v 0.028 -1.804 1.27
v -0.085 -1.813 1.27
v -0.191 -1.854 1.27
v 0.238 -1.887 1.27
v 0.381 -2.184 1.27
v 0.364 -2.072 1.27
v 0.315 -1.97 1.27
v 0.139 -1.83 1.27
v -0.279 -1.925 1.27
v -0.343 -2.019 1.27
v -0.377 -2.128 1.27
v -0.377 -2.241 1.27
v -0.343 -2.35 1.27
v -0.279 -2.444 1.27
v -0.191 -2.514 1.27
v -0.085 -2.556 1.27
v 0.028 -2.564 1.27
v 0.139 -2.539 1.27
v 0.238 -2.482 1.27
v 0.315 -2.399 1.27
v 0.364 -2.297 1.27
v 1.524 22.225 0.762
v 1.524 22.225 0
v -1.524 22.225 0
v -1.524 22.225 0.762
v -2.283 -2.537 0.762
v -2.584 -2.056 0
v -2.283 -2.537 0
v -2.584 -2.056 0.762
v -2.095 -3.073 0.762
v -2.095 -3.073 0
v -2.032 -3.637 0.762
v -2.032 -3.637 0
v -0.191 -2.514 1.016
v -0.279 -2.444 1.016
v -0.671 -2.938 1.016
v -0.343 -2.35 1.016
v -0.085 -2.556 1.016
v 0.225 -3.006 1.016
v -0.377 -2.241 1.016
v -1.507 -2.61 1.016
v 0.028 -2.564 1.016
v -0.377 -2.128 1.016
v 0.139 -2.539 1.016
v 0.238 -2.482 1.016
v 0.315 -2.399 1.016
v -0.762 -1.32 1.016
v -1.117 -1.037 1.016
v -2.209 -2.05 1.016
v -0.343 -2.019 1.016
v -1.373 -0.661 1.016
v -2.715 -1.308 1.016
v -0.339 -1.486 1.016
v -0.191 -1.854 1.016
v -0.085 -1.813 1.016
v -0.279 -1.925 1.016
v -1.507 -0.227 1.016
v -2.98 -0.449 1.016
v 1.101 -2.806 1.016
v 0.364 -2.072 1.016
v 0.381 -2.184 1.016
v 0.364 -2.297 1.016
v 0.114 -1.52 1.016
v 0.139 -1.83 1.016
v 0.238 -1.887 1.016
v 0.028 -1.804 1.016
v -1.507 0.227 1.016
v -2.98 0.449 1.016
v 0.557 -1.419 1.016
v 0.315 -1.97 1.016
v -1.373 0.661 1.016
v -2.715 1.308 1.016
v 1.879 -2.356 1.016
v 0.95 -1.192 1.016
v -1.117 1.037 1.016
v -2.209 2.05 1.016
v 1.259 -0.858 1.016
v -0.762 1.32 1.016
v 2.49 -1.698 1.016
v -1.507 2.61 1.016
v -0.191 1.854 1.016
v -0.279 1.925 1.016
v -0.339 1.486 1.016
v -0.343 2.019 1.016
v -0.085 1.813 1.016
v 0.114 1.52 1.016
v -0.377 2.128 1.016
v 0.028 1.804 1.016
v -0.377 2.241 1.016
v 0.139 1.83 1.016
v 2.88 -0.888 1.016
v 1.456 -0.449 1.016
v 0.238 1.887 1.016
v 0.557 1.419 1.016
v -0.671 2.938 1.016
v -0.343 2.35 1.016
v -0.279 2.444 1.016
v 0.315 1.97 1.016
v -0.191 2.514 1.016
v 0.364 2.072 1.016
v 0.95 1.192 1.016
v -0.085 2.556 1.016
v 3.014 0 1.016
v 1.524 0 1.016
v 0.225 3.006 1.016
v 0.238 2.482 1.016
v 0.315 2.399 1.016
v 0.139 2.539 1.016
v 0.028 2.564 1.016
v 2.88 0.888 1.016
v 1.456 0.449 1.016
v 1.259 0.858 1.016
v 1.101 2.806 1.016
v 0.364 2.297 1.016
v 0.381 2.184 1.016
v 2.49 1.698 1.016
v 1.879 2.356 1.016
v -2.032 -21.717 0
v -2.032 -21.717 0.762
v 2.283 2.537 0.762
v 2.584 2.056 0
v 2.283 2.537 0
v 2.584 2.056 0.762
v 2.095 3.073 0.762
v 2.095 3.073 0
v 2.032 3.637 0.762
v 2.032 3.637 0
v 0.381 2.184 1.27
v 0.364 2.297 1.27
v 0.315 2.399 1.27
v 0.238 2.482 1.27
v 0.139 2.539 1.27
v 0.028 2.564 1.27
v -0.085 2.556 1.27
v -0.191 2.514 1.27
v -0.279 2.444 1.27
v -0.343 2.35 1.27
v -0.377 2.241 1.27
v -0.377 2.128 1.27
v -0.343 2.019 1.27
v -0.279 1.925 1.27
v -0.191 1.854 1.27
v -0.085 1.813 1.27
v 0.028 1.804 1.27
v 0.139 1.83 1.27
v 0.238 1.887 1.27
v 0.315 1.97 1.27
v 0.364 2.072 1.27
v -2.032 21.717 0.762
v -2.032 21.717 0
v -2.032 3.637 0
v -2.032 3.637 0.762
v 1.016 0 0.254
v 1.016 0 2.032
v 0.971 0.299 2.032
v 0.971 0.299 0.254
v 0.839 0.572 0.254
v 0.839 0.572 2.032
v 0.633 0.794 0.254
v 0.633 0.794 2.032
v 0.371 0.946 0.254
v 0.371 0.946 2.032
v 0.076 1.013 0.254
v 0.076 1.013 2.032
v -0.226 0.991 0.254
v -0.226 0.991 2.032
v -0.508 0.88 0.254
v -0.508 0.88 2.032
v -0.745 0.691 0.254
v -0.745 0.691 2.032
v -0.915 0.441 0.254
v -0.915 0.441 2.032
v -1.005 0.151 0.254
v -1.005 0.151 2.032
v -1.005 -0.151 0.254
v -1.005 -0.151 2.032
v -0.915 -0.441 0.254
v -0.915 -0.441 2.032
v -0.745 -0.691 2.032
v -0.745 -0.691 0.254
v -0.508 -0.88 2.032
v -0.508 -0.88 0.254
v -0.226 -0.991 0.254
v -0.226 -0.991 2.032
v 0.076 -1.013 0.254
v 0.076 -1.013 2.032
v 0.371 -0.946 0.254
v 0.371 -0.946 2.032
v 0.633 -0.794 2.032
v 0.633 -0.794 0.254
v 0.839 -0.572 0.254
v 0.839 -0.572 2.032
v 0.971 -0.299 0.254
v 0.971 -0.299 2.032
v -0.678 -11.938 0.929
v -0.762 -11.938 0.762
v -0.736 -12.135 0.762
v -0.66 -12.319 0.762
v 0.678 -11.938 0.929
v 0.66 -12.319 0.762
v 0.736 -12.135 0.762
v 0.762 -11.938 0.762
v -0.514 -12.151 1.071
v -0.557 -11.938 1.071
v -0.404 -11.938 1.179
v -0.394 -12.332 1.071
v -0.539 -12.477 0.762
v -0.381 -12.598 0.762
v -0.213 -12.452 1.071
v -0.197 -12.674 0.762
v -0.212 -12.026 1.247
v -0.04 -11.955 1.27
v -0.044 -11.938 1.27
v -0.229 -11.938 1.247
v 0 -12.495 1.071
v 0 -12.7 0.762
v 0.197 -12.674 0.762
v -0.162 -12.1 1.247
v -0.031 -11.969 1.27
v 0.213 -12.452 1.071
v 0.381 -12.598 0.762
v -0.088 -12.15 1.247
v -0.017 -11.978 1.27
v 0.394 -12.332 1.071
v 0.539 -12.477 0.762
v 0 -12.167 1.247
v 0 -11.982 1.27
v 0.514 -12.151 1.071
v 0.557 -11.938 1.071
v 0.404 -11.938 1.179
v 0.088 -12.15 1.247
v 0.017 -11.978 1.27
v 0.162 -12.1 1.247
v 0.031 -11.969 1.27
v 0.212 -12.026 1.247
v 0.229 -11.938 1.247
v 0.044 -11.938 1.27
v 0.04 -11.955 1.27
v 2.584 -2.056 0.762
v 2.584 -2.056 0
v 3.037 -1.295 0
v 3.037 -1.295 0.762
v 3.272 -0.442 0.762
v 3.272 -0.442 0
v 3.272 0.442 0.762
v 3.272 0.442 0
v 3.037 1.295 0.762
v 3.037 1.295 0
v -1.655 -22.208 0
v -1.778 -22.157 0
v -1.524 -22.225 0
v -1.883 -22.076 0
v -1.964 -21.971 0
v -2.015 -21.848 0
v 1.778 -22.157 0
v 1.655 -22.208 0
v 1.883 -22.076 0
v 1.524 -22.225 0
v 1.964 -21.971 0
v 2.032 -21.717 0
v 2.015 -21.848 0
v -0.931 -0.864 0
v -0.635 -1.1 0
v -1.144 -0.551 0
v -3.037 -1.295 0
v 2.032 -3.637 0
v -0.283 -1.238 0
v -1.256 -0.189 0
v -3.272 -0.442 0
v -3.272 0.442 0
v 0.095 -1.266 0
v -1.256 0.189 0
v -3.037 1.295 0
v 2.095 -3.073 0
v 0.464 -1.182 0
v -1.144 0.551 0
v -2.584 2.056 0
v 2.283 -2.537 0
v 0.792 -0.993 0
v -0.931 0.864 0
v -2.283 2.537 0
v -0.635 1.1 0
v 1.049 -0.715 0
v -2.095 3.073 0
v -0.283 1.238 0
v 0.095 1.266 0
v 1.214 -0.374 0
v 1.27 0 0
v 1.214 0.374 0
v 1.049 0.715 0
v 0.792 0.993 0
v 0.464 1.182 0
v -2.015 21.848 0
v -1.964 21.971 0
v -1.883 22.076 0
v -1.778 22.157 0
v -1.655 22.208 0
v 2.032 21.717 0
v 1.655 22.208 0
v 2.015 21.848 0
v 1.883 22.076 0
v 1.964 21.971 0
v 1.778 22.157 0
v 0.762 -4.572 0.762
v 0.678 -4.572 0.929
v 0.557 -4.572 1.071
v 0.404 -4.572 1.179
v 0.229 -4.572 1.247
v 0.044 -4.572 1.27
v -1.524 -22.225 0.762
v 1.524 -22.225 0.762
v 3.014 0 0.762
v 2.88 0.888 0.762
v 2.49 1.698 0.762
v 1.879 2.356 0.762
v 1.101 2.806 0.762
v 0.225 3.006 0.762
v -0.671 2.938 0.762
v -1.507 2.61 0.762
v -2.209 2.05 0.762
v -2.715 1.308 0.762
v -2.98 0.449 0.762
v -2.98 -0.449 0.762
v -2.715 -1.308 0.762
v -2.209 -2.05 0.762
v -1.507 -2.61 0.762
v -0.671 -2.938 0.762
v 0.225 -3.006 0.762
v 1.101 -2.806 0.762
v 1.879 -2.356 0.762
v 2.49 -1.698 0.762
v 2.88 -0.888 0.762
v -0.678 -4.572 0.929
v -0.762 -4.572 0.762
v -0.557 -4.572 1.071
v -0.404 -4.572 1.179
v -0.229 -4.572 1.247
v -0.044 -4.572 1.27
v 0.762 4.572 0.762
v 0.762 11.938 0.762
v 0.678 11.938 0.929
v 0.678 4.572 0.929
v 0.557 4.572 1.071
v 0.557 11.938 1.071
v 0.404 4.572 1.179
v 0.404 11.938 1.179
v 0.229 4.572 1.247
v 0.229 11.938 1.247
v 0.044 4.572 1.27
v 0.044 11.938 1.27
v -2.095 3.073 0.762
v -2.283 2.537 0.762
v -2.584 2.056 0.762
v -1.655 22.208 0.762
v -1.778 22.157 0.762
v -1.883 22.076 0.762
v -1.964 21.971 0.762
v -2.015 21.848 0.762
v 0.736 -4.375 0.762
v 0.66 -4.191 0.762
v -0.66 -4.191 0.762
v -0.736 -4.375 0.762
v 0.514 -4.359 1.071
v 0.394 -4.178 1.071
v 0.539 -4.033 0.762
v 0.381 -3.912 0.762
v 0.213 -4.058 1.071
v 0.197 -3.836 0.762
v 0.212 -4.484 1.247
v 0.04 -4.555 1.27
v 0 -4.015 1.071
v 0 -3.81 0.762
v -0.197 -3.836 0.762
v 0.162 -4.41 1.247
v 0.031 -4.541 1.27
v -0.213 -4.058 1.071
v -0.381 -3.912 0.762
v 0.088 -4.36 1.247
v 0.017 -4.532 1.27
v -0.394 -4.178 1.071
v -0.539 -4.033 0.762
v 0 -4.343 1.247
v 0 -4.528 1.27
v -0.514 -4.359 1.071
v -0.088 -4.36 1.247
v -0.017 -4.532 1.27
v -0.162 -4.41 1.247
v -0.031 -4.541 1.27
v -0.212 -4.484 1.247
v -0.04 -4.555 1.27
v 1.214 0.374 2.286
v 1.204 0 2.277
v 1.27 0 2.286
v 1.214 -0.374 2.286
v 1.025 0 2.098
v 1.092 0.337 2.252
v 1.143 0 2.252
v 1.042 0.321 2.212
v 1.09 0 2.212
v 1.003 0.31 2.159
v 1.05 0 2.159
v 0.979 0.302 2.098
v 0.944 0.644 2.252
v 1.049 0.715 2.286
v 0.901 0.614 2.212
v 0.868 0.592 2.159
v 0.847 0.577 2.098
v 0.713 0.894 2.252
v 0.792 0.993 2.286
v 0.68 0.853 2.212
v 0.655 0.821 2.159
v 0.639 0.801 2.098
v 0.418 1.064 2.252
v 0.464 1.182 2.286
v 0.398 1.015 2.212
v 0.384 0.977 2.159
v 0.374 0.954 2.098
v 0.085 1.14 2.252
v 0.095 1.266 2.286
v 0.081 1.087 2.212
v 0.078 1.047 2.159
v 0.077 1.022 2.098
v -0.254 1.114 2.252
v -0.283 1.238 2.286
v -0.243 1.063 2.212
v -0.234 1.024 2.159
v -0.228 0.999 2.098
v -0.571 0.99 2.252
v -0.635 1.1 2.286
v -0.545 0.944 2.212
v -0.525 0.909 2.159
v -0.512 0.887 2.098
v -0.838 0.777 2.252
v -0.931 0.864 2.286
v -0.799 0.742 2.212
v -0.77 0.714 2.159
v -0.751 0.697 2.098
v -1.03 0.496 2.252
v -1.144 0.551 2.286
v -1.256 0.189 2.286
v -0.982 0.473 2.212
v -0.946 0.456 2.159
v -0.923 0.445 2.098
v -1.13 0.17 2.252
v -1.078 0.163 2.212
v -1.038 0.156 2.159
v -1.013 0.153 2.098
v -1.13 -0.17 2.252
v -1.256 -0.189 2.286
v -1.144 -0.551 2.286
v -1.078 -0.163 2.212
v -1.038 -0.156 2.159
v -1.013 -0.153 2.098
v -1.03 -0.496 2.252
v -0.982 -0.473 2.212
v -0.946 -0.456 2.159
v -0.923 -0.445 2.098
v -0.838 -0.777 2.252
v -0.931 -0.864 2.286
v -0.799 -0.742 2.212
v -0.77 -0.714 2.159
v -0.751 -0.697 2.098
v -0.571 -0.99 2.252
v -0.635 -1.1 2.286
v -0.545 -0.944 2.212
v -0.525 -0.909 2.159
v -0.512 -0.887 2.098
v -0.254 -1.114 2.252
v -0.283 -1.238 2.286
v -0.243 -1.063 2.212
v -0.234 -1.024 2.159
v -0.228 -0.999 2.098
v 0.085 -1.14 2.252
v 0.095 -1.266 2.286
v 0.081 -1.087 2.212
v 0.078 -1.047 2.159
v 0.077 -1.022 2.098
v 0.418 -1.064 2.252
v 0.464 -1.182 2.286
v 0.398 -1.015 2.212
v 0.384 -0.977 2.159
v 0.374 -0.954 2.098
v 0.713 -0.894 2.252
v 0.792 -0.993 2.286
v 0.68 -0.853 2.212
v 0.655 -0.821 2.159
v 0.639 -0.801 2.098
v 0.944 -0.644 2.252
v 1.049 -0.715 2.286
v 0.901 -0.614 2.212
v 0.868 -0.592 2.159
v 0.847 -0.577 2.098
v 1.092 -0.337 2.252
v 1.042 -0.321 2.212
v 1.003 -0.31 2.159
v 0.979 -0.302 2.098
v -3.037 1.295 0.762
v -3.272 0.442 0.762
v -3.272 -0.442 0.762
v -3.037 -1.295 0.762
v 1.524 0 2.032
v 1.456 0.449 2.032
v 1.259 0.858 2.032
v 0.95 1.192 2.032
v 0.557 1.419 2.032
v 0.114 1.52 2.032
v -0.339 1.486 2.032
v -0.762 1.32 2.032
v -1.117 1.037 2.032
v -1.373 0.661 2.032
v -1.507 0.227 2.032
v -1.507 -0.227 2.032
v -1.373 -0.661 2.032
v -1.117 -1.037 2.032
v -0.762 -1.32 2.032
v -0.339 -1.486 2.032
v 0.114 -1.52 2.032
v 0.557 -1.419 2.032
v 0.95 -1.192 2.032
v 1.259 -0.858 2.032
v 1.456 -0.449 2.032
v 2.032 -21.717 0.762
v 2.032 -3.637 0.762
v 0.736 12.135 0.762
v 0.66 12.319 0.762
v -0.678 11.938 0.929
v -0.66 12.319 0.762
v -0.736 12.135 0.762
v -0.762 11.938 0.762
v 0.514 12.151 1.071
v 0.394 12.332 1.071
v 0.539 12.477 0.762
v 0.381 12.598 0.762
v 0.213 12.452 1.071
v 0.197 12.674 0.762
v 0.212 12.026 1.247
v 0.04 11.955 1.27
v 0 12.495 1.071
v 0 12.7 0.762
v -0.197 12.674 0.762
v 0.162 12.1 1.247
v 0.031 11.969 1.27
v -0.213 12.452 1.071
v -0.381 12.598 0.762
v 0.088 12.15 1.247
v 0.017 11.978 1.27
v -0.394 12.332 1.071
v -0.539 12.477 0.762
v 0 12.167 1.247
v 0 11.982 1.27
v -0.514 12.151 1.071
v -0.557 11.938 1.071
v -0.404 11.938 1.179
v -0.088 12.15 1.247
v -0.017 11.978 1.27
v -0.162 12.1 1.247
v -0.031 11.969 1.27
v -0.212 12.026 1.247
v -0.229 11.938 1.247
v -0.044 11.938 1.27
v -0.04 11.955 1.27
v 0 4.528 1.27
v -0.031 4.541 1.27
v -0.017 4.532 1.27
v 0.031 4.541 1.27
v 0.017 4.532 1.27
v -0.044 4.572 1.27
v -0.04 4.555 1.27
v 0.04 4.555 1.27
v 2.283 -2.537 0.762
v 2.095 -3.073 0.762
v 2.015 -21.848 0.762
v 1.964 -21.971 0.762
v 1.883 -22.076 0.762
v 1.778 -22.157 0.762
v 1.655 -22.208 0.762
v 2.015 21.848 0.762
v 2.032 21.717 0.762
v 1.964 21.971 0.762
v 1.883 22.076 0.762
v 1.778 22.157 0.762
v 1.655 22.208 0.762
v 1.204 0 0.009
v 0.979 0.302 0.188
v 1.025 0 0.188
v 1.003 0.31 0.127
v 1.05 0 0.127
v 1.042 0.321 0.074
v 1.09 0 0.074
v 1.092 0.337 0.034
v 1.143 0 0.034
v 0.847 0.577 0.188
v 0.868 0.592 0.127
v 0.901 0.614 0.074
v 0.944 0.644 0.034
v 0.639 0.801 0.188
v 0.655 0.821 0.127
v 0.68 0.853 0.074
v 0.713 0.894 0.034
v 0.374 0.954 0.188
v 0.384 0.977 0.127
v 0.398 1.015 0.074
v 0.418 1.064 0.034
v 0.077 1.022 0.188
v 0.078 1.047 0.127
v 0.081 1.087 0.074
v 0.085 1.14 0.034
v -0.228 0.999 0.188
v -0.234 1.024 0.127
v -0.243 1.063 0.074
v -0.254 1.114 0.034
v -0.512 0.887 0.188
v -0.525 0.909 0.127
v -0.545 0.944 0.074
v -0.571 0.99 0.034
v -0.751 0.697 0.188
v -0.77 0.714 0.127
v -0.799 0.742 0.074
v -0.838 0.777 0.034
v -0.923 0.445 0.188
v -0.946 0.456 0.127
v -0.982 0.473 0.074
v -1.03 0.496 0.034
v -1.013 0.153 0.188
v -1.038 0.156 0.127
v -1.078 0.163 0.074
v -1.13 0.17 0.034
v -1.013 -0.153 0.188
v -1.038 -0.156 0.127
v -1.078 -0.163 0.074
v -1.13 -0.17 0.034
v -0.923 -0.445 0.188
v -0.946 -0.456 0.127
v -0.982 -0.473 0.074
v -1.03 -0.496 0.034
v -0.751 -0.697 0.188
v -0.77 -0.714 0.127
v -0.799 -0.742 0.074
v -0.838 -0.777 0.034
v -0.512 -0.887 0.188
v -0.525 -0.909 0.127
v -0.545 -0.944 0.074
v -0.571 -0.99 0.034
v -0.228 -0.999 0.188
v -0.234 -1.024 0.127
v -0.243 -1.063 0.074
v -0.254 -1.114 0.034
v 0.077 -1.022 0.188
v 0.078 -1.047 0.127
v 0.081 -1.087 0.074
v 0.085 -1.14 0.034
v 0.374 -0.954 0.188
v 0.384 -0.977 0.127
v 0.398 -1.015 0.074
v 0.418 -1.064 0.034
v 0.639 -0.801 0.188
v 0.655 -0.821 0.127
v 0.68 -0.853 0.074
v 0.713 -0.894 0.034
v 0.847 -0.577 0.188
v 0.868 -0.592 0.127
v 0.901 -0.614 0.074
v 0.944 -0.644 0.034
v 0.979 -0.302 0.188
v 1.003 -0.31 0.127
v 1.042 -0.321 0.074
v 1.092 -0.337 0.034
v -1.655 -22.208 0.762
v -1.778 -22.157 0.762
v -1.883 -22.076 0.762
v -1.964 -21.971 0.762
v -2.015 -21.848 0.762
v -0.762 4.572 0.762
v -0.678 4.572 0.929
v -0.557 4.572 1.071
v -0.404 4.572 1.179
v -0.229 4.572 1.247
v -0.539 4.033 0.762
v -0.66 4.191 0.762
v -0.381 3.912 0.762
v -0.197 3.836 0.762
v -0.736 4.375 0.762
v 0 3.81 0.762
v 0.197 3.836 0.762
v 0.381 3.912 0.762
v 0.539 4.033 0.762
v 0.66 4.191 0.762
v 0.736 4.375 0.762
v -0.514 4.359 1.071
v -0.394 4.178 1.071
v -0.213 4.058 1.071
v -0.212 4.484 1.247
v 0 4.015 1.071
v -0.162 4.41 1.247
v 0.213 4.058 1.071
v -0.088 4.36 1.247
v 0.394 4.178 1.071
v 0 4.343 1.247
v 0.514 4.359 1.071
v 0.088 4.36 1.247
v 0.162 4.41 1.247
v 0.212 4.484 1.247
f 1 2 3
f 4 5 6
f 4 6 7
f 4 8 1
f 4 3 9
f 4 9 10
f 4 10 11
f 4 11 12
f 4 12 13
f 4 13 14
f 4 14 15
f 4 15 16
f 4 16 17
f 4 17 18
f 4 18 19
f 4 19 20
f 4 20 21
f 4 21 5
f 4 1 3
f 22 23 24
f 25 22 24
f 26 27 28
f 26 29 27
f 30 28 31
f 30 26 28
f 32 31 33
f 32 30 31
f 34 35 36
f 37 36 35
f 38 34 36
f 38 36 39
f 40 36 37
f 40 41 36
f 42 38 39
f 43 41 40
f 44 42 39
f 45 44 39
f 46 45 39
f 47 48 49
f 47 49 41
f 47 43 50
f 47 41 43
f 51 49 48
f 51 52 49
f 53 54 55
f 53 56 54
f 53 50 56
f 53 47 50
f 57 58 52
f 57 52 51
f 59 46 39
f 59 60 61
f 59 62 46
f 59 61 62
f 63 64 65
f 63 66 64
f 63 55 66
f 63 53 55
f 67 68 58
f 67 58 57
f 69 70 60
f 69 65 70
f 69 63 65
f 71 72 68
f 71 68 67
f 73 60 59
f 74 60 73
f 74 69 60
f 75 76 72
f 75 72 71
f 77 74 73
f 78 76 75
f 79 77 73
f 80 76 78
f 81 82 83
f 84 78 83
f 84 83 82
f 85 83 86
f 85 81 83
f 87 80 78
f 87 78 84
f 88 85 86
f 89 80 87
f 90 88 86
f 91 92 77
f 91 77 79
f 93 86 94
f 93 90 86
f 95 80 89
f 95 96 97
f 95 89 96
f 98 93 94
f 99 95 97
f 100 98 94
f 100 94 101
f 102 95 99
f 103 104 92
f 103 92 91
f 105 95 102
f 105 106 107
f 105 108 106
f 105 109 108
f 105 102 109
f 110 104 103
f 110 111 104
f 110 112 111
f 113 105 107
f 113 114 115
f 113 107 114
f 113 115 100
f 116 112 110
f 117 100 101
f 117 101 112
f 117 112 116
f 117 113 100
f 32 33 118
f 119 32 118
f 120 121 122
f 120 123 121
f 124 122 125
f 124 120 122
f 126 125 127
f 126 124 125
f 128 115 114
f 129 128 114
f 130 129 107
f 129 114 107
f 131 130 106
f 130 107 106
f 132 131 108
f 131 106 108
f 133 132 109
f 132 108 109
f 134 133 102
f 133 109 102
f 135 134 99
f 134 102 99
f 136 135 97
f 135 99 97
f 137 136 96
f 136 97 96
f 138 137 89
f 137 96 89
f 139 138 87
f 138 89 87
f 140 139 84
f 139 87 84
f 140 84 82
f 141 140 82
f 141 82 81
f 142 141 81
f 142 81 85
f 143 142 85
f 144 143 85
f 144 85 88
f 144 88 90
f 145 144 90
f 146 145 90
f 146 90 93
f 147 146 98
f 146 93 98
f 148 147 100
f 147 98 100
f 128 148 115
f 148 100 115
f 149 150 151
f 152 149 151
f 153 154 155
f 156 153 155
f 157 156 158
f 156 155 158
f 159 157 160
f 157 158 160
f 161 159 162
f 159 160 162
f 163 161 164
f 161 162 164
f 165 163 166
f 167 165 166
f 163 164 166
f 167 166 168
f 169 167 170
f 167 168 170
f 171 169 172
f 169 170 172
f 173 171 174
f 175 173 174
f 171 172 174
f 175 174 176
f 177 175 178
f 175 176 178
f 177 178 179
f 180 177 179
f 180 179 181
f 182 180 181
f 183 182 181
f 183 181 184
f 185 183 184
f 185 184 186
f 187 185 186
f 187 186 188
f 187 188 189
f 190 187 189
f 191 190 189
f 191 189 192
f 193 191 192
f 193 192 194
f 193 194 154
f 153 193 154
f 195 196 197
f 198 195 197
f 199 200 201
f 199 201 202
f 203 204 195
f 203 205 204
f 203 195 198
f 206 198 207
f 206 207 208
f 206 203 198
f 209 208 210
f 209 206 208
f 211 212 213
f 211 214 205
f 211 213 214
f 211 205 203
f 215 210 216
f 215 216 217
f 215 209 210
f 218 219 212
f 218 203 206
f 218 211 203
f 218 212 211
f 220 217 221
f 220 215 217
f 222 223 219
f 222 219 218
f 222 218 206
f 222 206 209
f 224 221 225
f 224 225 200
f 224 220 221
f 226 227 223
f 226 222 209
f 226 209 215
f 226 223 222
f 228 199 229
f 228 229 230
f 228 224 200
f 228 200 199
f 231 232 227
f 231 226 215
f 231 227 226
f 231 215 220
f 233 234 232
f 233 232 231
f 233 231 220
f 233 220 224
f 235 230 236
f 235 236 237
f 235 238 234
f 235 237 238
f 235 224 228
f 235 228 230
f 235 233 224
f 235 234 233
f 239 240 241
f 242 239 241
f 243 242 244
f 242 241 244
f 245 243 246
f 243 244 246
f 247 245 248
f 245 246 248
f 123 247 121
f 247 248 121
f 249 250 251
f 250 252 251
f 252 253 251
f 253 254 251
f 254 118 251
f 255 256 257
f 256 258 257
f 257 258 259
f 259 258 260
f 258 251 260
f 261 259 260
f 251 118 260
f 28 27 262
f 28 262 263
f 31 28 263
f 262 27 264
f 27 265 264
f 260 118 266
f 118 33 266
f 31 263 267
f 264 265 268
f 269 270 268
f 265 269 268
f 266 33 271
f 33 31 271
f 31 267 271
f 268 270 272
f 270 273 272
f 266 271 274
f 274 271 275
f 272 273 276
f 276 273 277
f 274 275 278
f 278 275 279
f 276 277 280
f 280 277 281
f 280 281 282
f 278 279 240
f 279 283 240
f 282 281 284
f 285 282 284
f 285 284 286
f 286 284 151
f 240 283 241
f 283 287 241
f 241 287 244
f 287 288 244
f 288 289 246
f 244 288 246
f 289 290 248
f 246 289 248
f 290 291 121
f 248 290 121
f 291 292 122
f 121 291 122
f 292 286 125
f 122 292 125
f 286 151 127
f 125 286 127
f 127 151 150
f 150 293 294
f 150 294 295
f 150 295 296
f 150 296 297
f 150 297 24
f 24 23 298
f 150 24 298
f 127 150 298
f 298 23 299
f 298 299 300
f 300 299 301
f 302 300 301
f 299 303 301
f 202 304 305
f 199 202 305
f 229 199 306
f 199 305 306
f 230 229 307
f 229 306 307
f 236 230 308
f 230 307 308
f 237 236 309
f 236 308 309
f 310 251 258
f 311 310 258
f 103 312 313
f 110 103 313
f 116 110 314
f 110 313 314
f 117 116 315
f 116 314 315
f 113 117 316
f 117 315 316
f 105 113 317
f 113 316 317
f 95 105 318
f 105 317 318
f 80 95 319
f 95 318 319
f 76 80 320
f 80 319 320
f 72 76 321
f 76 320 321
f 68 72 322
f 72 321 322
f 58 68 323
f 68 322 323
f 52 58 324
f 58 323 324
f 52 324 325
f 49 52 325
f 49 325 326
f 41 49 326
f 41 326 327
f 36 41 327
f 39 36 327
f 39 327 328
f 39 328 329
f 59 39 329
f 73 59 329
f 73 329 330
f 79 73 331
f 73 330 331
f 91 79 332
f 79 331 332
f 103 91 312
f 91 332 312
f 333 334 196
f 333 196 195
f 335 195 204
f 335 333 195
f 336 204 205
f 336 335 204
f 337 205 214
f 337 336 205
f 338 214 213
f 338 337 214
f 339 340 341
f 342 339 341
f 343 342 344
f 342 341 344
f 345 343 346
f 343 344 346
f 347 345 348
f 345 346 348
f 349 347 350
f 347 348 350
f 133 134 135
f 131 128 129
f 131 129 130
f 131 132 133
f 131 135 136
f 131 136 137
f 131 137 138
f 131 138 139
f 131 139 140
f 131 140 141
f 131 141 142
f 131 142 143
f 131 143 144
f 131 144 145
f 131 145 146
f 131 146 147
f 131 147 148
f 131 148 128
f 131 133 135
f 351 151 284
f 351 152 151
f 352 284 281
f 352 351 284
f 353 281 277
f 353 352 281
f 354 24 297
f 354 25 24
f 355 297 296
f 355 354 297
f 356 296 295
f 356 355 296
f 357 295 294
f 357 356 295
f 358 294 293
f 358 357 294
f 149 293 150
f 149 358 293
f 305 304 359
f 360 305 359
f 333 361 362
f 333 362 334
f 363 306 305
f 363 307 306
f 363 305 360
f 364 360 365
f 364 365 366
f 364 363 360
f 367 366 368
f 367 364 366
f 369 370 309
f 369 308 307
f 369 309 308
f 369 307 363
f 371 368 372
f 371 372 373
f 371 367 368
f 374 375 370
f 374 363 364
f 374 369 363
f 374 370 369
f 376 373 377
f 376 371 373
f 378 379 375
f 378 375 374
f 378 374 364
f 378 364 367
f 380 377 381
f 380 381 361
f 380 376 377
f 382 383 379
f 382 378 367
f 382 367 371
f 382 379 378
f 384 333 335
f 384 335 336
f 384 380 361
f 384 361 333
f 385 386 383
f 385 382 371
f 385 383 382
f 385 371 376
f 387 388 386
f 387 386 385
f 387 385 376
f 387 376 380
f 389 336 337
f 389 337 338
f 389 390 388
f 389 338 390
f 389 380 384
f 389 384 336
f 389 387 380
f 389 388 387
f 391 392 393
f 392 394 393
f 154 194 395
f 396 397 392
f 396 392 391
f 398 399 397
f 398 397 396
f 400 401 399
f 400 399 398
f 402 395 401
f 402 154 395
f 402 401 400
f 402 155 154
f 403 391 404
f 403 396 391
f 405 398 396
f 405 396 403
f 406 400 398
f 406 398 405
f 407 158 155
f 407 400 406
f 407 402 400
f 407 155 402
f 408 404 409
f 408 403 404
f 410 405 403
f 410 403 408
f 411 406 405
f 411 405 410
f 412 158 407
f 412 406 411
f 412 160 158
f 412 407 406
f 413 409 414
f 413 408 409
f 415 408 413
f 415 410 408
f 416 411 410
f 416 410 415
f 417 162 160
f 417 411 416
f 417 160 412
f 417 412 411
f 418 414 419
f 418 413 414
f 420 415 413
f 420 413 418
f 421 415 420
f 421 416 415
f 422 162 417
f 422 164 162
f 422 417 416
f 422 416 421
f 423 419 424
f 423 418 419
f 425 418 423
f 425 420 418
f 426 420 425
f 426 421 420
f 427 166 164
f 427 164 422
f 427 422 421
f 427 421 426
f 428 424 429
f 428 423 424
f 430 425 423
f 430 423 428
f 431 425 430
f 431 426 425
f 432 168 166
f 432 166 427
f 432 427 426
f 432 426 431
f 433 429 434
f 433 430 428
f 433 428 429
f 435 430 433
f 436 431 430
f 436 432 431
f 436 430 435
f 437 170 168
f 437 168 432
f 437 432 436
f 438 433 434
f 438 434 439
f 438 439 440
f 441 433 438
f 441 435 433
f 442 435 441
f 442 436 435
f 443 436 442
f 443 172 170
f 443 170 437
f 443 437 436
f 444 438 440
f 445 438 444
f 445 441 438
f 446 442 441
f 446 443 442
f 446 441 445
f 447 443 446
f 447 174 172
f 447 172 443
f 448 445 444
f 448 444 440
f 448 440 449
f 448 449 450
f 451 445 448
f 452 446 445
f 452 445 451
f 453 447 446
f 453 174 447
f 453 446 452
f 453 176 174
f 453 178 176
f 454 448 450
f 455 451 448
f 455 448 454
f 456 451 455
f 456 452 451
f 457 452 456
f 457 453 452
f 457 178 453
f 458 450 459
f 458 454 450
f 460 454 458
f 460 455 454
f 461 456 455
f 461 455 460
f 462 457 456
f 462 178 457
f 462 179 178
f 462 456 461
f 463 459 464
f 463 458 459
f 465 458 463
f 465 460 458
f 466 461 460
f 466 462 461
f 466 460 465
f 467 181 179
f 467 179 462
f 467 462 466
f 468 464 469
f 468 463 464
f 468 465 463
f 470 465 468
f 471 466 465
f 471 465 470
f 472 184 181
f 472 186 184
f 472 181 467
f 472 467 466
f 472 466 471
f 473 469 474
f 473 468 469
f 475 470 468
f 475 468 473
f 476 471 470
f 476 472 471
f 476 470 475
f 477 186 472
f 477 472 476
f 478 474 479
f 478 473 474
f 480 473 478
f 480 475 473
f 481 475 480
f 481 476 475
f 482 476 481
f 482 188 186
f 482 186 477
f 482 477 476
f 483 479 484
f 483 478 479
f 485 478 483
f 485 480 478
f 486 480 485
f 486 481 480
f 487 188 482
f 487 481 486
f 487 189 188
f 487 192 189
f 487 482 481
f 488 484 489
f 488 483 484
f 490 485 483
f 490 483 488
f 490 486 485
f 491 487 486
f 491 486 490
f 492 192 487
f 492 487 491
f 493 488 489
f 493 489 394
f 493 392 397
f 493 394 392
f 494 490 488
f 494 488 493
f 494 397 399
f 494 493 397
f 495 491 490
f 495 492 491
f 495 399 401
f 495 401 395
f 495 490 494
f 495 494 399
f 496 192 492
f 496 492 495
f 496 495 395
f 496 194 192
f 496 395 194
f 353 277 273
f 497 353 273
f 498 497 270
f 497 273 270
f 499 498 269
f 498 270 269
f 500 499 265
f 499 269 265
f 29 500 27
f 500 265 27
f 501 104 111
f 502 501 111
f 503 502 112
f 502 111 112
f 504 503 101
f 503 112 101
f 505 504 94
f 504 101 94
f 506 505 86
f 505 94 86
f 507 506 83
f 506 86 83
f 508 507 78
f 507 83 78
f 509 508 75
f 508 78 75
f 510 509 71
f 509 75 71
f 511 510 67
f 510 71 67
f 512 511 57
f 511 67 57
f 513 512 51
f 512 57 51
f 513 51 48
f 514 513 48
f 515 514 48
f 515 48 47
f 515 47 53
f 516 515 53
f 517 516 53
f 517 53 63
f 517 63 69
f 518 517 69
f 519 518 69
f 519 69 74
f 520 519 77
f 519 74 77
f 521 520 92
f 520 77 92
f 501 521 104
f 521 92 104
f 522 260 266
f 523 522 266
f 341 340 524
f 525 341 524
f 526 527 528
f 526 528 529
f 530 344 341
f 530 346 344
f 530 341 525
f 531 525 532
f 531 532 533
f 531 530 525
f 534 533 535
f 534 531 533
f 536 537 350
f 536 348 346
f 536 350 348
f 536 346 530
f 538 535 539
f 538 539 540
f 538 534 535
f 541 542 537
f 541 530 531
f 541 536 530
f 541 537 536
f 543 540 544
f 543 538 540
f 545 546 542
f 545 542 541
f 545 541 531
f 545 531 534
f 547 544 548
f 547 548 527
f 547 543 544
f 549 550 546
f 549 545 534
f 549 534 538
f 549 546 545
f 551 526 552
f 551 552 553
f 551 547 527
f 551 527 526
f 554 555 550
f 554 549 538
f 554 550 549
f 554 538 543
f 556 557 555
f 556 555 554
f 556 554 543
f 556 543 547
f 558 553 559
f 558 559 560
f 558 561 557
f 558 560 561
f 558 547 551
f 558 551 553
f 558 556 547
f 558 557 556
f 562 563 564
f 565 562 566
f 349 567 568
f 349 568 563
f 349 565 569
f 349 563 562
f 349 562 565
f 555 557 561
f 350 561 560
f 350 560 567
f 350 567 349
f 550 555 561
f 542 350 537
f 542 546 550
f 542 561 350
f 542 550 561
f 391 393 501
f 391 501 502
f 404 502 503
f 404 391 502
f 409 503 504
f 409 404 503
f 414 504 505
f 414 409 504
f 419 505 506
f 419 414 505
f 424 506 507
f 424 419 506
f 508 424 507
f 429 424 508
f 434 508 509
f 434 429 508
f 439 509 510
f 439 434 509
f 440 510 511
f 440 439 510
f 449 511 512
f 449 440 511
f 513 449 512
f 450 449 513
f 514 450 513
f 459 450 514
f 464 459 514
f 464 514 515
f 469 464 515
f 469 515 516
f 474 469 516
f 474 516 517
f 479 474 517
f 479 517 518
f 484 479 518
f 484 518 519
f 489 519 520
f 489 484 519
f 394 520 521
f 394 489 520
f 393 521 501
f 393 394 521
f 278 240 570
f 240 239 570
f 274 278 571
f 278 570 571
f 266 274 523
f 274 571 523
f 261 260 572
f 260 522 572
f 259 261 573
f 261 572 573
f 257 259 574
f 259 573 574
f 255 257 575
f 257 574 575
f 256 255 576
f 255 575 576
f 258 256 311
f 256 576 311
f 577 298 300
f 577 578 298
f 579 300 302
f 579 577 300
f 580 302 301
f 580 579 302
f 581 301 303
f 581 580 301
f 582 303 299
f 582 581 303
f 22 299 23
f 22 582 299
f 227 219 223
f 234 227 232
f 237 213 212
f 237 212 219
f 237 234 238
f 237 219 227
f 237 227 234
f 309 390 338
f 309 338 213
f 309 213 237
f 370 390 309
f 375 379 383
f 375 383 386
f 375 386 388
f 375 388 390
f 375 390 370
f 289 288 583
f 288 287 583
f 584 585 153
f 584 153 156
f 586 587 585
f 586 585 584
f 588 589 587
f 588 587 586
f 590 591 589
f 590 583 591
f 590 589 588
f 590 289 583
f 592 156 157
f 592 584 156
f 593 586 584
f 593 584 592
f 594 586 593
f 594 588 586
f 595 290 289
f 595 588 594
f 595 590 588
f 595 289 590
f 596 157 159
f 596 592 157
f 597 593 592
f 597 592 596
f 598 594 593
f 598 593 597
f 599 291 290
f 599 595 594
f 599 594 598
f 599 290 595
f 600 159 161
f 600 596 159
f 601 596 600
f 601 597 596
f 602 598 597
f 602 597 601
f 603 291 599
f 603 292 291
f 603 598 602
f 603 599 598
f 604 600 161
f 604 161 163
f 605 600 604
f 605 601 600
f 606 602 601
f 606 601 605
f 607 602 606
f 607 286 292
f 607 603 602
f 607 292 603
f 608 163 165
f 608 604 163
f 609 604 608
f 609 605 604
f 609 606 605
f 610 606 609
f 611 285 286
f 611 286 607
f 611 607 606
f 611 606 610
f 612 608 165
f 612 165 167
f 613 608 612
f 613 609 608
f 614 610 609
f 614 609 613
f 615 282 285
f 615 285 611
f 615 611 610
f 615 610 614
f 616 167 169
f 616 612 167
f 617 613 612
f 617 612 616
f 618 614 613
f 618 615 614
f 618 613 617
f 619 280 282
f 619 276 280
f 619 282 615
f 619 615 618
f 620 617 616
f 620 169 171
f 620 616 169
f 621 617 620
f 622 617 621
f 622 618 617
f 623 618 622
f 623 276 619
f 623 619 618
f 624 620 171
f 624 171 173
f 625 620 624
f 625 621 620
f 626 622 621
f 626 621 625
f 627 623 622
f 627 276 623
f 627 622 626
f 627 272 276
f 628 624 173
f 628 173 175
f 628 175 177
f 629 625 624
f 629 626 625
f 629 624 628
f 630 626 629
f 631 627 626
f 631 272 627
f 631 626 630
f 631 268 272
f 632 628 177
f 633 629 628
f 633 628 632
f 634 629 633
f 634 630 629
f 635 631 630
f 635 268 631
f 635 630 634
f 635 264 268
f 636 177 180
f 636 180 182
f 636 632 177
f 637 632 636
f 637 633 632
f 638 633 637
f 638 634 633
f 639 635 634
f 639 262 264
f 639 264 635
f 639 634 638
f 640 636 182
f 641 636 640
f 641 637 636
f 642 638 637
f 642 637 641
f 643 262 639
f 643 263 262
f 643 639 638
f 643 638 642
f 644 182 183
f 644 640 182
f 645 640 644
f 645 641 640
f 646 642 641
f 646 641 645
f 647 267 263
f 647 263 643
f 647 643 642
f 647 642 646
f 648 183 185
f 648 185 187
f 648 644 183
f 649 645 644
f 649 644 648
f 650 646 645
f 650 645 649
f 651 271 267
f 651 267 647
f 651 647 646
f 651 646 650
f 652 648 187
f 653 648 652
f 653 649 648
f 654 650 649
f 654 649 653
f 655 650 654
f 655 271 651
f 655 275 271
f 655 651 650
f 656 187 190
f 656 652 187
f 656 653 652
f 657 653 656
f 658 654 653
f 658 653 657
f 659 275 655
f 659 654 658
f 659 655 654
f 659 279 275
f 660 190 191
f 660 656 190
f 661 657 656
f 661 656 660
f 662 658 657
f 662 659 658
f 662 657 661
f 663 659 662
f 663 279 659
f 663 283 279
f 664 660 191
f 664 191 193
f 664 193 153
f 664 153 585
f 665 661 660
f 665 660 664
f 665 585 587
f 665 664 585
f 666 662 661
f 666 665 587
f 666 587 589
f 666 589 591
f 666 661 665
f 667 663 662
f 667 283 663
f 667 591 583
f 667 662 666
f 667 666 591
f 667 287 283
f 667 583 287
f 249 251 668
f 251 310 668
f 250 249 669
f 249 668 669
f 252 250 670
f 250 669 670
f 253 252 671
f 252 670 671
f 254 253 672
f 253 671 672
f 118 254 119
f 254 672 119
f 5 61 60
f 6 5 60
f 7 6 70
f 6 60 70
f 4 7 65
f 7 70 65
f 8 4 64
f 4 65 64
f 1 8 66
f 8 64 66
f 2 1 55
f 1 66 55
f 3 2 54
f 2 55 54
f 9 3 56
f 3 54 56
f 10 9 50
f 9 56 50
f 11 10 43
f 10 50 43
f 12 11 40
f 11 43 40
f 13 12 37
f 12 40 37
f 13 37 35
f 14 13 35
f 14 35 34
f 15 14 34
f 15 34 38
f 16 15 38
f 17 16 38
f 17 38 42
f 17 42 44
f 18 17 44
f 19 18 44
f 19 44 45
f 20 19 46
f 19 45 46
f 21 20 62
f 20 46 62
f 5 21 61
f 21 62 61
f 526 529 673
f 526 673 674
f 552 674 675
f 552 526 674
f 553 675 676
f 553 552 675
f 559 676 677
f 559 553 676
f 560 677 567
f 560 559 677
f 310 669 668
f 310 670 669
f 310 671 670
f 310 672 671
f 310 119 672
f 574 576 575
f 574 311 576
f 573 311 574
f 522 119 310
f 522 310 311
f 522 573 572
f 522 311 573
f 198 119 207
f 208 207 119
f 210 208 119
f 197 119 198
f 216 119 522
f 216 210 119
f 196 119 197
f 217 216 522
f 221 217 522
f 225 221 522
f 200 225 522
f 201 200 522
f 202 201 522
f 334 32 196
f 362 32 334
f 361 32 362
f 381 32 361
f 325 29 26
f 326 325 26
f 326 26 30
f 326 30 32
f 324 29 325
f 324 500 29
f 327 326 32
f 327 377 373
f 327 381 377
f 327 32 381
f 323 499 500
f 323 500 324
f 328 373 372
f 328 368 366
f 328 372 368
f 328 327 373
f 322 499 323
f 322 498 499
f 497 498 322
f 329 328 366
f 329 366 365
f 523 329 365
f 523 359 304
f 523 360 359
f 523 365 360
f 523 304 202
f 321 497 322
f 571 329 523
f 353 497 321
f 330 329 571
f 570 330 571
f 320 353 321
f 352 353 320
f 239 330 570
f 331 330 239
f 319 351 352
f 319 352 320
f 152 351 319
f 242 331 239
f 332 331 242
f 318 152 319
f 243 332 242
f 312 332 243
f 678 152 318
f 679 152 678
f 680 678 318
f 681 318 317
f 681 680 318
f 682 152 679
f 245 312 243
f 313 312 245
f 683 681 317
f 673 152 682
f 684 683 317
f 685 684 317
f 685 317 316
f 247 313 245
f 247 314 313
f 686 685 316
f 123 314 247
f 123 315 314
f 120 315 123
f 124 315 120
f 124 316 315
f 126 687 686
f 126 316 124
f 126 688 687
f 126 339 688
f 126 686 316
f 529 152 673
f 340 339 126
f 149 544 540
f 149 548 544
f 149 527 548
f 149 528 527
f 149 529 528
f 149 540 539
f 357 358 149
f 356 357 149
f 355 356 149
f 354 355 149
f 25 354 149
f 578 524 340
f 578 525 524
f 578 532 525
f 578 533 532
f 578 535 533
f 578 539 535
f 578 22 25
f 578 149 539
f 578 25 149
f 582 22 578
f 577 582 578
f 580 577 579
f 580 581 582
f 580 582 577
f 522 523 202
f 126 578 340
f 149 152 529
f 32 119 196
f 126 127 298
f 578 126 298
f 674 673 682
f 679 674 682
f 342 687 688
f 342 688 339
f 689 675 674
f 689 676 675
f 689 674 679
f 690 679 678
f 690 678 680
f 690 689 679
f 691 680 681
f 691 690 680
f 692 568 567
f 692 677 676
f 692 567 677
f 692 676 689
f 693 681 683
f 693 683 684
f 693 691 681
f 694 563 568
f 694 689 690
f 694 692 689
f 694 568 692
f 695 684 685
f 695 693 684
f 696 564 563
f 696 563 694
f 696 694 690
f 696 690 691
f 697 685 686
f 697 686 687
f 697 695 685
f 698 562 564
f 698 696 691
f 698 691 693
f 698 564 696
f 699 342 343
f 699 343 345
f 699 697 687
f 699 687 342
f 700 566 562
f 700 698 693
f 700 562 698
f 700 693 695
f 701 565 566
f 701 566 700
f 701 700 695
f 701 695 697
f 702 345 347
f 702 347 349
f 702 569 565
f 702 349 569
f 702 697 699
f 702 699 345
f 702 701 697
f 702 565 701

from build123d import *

# Parameters (mm, degrees)
F1_DEPTH      = 0.762
F2_R          = 2.54
F3_R          = 0.508
F4_R          = 3.0139316414
F5_DEPTH      = 0.254
F6_R          = 1.524
F7_DEPTH      = 1.27
F8_SIZE       = 0.254
F9_R          = 0.381
F10_DEPTH     = 0.254
F11_R         = 1.016
F12_DEPTH     = 25.4
F13_R         = 0.25399
F15_DEPTH     = 0.508
F16_T1_DEPTH  = 7.366
F16_T3_DEPTH  = 7.366
F16_T6_ANGLE  = 180
F16_T8_ANGLE  = 180
F16_T10_ANGLE = 180
F16_T12_ANGLE = 180


# Not quite as in the source:
# - a fillet or chamfer that OpenCascade refuses, or shapes differently, is made with other operations: its cross-section is extruded or revolved along the edge and cut away or added
# - a fillet or chamfer is up to 0.001 mm smaller than in the source, because OpenCascade refuses the exact size


with BuildPart() as f1:
    # F0 (on Top) → F1 (new body)
    with BuildSketch(Plane.XY):
        with BuildLine():
            Line((2.032, -14.605), (2.032, -2.6027254946))
            ThreePointArc((2.032, -2.6027254946), (3.302, 0), (2.032, 2.6027254946))
            Line((2.032, 2.6027254946), (2.032, 14.605))
            Line((2.032, 14.605), (2.032, 22.225))
            Line((2.032, 22.225), (-2.032, 22.225))
            Line((-2.032, 22.225), (-2.032, 14.605))
            Line((-2.032, 14.605), (-2.032, 2.6027254946))
            ThreePointArc((-2.032, 2.6027254946), (-3.302, 0), (-2.032, -2.6027254946))
            Line((-2.032, -2.6027254946), (-2.032, -14.605))
            Line((-2.032, -14.605), (-2.032, -22.225))
            Line((-2.032, -22.225), (2.032, -22.225))
            Line((2.032, -22.225), (2.032, -14.605))
        make_face()
    extrude(amount=F1_DEPTH)

    # F2
    f2_edges = [f1.edges().sort_by_distance(p)[0] for p in [
        (-2.032, 2.602725, 0.381),
        (-2.032, -2.602725, 0.381),
        (2.032, 2.602725, 0.381),
        (2.032, -2.602725, 0.381),
    ]]
    fillet(f2_edges, radius=F2_R)

    # F3
    f3_edges = [f1.edges().sort_by_distance(p)[0] for p in [
        (-2.032, -22.225, 0.381),
        (2.032, -22.225, 0.381),
        (-2.032, 22.225, 0.381),
        (2.032, 22.225, 0.381),
    ]]
    fillet(f3_edges, radius=F3_R)

    # F4 (on face) → F5 (join)
    with BuildSketch(Plane.XY.offset(0.762)):
        Circle(F4_R)
    extrude(amount=F5_DEPTH)

    # F6 (on face) → F7 (join)
    with BuildSketch(Plane.XY.offset(1.016)):
        Circle(F6_R)
    extrude(amount=F7_DEPTH)

    # F8
    f8_edges = [f1.edges().sort_by_distance(p)[0] for p in [
        (-1.524, 0, 2.286),
    ]]
    chamfer(f8_edges, length=F8_SIZE)

    # F9 (on face) → F10 (join)
    with BuildSketch(Plane.XY.offset(1.016)):
        with Locations((0, 2.1844)):
            Circle(F9_R)
        with Locations((0, -2.1844)):
            Circle(F9_R)
    extrude(amount=F10_DEPTH)

    # F11 (on face) → F12 (cut)
    with BuildSketch(Plane.XY.offset(2.286)):
        Circle(F11_R)
    extrude(amount=-F12_DEPTH, mode=Mode.SUBTRACT)

    # F13 (radius 0.254 in the source; OpenCascade refuses exactly that, so slightly less here)
    f13_edges = [f1.edges().sort_by_distance(p)[0] for p in [
        (-1.016, 0, 2.286),
        (-1.016, 0, 0),
    ]]
    fillet(f13_edges, radius=F13_R)

    # F14 (on face) → F15 (join)
    with BuildSketch(Plane.XY.offset(0.762)):
        with BuildLine():
            ThreePointArc((0, 12.7), (-0.5388153673, 12.4768153673), (-0.762, 11.938))
            Line((-0.762, 11.938), (-0.762, 4.572))
            ThreePointArc((-0.762, 4.572), (-0.5388153673, 4.0331846327), (0, 3.81))
            ThreePointArc((0, 3.81), (0.5388153673, 4.0331846327), (0.762, 4.572))
            Line((0.762, 4.572), (0.762, 11.938))
            ThreePointArc((0.762, 11.938), (0.5388153673, 12.4768153673), (0, 12.7))
        make_face()
        with BuildLine():
            ThreePointArc((0, -3.81), (-0.5388153673, -4.0331846327), (-0.762, -4.572))
            Line((-0.762, -4.572), (-0.762, -11.938))
            ThreePointArc((-0.762, -11.938), (-0.5388153673, -12.4768153673), (0, -12.7))
            ThreePointArc((0, -12.7), (0.5388153673, -12.4768153673), (0.762, -11.938))
            Line((0.762, -11.938), (0.762, -4.572))
            ThreePointArc((0.762, -4.572), (0.5388153673, -4.0331846327), (0, -3.81))
        make_face()
    extrude(amount=F15_DEPTH)

    # F16: fillet of radius 0.762 on 8 edges, made by hand

    # F16_s2 → F16_t1 (cut)
    with BuildSketch(Plane.XZ.offset(-11.938)):
        with BuildLine():
            ThreePointArc((-0.762, 0.762), (-0.4835204154, 1.1301703947), (-0.0435795103, 1.27))
            Line((-0.0435795103, 1.27), (-0.762, 1.27))
            Line((-0.762, 1.27), (-0.762, 0.762))
        make_face()
        with BuildLine():
            ThreePointArc((0.762, 0.762), (0.4835204154, 1.1301703947), (0.0435795103, 1.27))
            Line((0.0435795103, 1.27), (0.762, 1.27))
            Line((0.762, 1.27), (0.762, 0.762))
        make_face()
    extrude(amount=F16_T1_DEPTH, mode=Mode.SUBTRACT)

    # F16_s4 → F16_t3 (cut)
    with BuildSketch(Plane.XZ.offset(4.572)):
        with BuildLine():
            ThreePointArc((-0.762, 0.762), (-0.4835204154, 1.1301703947), (-0.0435795103, 1.27))
            Line((-0.0435795103, 1.27), (-0.762, 1.27))
            Line((-0.762, 1.27), (-0.762, 0.762))
        make_face()
        with BuildLine():
            ThreePointArc((0.762, 0.762), (0.4835204154, 1.1301703947), (0.0435795103, 1.27))
            Line((0.0435795103, 1.27), (0.762, 1.27))
            Line((0.762, 1.27), (0.762, 0.762))
        make_face()
    extrude(amount=F16_T3_DEPTH, mode=Mode.SUBTRACT)

    # F16_s5 → F16_t6 (revolve, cut)
    with BuildSketch(Plane.XZ.offset(-11.938)):
        with BuildLine():
            ThreePointArc((0.762, 0.762), (0.4835204154, 1.1301703947), (0.0435795103, 1.27))
            Line((0.0435795103, 1.27), (0.762, 1.27))
            Line((0.762, 1.27), (0.762, 0.762))
        make_face()
    revolve(axis=Axis((0, 11.938, 1.27), (0, 0, 1)), revolution_arc=F16_T6_ANGLE, mode=Mode.SUBTRACT)

    # F16_s7 → F16_t8 (revolve, cut)
    with BuildSketch(Plane.XZ.offset(-4.572)):
        with BuildLine():
            ThreePointArc((-0.762, 0.762), (-0.4835204154, 1.1301703947), (-0.0435795103, 1.27))
            Line((-0.0435795103, 1.27), (-0.762, 1.27))
            Line((-0.762, 1.27), (-0.762, 0.762))
        make_face()
    revolve(axis=Axis((0, 4.572, 1.27), (0, 0, 1)), revolution_arc=F16_T8_ANGLE, mode=Mode.SUBTRACT)

    # F16_s9 → F16_t10 (revolve, cut)
    with BuildSketch(Plane.XZ.offset(4.572)):
        with BuildLine():
            ThreePointArc((0.762, 0.762), (0.4835204154, 1.1301703947), (0.0435795103, 1.27))
            Line((0.0435795103, 1.27), (0.762, 1.27))
            Line((0.762, 1.27), (0.762, 0.762))
        make_face()
    revolve(axis=Axis((0, -4.572, 1.27), (0, 0, 1)), revolution_arc=F16_T10_ANGLE, mode=Mode.SUBTRACT)

    # F16_s11 → F16_t12 (revolve, cut)
    with BuildSketch(Plane.XZ.offset(11.938)):
        with BuildLine():
            ThreePointArc((-0.762, 0.762), (-0.4835204154, 1.1301703947), (-0.0435795103, 1.27))
            Line((-0.0435795103, 1.27), (-0.762, 1.27))
            Line((-0.762, 1.27), (-0.762, 0.762))
        make_face()
    revolve(axis=Axis((0, -11.938, 1.27), (0, 0, 1)), revolution_arc=F16_T12_ANGLE, mode=Mode.SUBTRACT)


solid = f1.part
